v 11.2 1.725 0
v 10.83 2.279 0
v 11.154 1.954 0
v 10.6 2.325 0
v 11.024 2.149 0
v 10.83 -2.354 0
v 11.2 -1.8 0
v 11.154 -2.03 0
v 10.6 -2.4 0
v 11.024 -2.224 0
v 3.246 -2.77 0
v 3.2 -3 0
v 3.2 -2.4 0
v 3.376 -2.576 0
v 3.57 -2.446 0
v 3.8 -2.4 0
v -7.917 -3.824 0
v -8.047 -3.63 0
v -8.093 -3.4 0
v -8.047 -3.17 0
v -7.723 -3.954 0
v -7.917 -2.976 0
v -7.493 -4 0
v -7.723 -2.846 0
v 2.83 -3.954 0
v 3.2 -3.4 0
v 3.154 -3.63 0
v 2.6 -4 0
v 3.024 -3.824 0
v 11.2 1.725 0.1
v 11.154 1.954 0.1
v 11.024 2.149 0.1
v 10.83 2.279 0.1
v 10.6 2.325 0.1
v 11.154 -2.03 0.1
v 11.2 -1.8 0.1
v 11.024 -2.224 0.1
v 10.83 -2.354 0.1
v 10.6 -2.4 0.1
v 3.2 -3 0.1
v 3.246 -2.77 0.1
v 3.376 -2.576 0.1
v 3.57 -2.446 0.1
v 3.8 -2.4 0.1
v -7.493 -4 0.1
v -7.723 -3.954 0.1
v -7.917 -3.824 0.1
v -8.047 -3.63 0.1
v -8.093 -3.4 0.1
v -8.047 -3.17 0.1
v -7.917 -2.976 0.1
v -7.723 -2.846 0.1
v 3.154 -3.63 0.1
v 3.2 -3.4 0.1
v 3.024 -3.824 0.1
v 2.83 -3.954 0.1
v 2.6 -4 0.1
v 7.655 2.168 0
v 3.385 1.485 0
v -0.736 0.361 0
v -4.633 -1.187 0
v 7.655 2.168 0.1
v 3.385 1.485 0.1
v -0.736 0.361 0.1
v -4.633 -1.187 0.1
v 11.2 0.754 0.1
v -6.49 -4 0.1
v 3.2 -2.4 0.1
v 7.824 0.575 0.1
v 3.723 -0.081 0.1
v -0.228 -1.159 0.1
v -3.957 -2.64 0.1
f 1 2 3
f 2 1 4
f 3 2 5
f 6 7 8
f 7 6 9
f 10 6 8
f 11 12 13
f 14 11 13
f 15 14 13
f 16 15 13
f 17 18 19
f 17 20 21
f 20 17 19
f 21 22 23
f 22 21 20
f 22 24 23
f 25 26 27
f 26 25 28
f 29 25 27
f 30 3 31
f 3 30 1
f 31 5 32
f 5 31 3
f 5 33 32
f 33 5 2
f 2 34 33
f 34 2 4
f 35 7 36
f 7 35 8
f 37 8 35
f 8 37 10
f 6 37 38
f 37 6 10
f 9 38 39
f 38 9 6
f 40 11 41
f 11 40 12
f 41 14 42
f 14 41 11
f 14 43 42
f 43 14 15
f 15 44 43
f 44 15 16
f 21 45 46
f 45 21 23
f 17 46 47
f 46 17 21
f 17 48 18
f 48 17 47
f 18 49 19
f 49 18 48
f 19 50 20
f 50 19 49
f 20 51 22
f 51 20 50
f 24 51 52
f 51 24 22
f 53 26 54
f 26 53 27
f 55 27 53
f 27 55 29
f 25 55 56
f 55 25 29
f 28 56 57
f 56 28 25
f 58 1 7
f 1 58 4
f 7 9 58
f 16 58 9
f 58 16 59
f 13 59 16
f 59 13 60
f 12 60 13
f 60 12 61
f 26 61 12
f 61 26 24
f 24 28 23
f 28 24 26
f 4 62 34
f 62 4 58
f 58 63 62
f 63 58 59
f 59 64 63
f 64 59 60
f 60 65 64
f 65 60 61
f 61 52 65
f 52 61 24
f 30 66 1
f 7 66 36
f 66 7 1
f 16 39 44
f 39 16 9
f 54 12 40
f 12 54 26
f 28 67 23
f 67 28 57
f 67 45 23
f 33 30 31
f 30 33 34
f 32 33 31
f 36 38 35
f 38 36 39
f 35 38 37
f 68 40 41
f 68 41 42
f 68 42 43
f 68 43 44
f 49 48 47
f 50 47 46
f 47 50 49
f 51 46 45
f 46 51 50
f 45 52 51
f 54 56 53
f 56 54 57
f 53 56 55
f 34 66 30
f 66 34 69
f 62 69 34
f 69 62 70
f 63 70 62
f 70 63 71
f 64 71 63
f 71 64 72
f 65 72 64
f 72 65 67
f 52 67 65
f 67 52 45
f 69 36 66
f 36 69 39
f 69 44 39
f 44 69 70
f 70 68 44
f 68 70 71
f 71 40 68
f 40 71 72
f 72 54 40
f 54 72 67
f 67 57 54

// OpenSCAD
// file: ../p/7-16cyli.scad
use <../lib.scad>
function ldraw_lib__7_16cyli() = [
// 0 Cylinder 0.4375
// 0 Name: 7-16cyli.dat
// 0 Author: Magnus Forsberg [MagFors]
// 0 !LDRAW_ORG Primitive UPDATE 2024-01
// 0 !LICENSE Licensed under CC BY 4.0 : see CAreadme.txt
// 
// 0 BFC CERTIFY CCW
  [0,"BFC","CERTIFY"],
  [0,"BFC","CCW"],
// 
// 0 !HISTORY 2009-05-02 [PTadmin] Official Update 2009-01
// 0 !HISTORY 2024-01-03 [MagFors] Complete regeneration, original by guyvivan
// 0 !HISTORY 2024-01-29 [OrionP] Official Update 2024-01
// 
// 4 16 0.9239 0 0.3827 1 0 0 1 1 0 0.9239 1 0.3827
  [4,16,0.9239,0,0.3827,1,0,0,1,1,0,0.9239,1,0.3827],
// 4 16 0.7071 0 0.7071 0.9239 0 0.3827 0.9239 1 0.3827 0.7071 1 0.7071
  [4,16,0.7071,0,0.7071,0.9239,0,0.3827,0.9239,1,0.3827,0.7071,1,0.7071],
// 4 16 0.3827 0 0.9239 0.7071 0 0.7071 0.7071 1 0.7071 0.3827 1 0.9239
  [4,16,0.3827,0,0.9239,0.7071,0,0.7071,0.7071,1,0.7071,0.3827,1,0.9239],
// 4 16 0 0 1 0.3827 0 0.9239 0.3827 1 0.9239 0 1 1
  [4,16,0,0,1,0.3827,0,0.9239,0.3827,1,0.9239,0,1,1],
// 4 16 -0.3827 0 0.9239 0 0 1 0 1 1 -0.3827 1 0.9239
  [4,16,-0.3827,0,0.9239,0,0,1,0,1,1,-0.3827,1,0.9239],
// 4 16 -0.7071 0 0.7071 -0.3827 0 0.9239 -0.3827 1 0.9239 -0.7071 1 0.7071
  [4,16,-0.7071,0,0.7071,-0.3827,0,0.9239,-0.3827,1,0.9239,-0.7071,1,0.7071],
// 4 16 -0.9239 0 0.3827 -0.7071 0 0.7071 -0.7071 1 0.7071 -0.9239 1 0.3827
  [4,16,-0.9239,0,0.3827,-0.7071,0,0.7071,-0.7071,1,0.7071,-0.9239,1,0.3827],
// 0 // conditional lines
// 5 24 1 1 0 1 0 0 1 1 -0.4142 0.9239 1 0.3827
  [5,24,1,1,0,1,0,0,1,1,-0.4142,0.9239,1,0.3827],
// 5 24 0.9239 1 0.3827 0.9239 0 0.3827 1 1 0 0.7071 1 0.7071
  [5,24,0.9239,1,0.3827,0.9239,0,0.3827,1,1,0,0.7071,1,0.7071],
// 5 24 0.7071 1 0.7071 0.7071 0 0.7071 0.9239 1 0.3827 0.3827 1 0.9239
  [5,24,0.7071,1,0.7071,0.7071,0,0.7071,0.9239,1,0.3827,0.3827,1,0.9239],
// 5 24 0.3827 1 0.9239 0.3827 0 0.9239 0.7071 1 0.7071 0 1 1
  [5,24,0.3827,1,0.9239,0.3827,0,0.9239,0.7071,1,0.7071,0,1,1],
// 5 24 0 1 1 0 0 1 0.3827 1 0.9239 -0.3827 1 0.9239
  [5,24,0,1,1,0,0,1,0.3827,1,0.9239,-0.3827,1,0.9239],
// 5 24 -0.3827 1 0.9239 -0.3827 0 0.9239 0 1 1 -0.7071 1 0.7071
  [5,24,-0.3827,1,0.9239,-0.3827,0,0.9239,0,1,1,-0.7071,1,0.7071],
// 5 24 -0.7071 1 0.7071 -0.7071 0 0.7071 -0.3827 1 0.9239 -0.9239 1 0.3827
  [5,24,-0.7071,1,0.7071,-0.7071,0,0.7071,-0.3827,1,0.9239,-0.9239,1,0.3827],
// 5 24 -0.9239 1 0.3827 -0.9239 0 0.3827 -0.7071 1 0.7071 -1.0824 1 0
  [5,24,-0.9239,1,0.3827,-0.9239,0,0.3827,-0.7071,1,0.7071,-1.0824,1,0],
// 0 // Build by LDPartEditor (PrimGen 2.X)
];
module ldraw_lib__7_16cyli(step=0, col=false, unit=2/5, alt=false, line=0.2, solid=!$preview)
    makepoly(ldraw_lib__7_16cyli(), step=step, col=col, unit=unit, alt=alt, line=line, solid=solid);
ldraw_lib__7_16cyli(line=0.2);
// file: ../p/1-4cyli.scad
use <../lib.scad>
function ldraw_lib__1_4cyli() = [
// 0 Cylinder 0.25
// 0 Name: 1-4cyli.dat
// 0 Author: James Jessiman
// 0 !LDRAW_ORG Primitive UPDATE 2012-01
// 0 !LICENSE Licensed under CC BY 4.0 : see CAreadme.txt
// 
// 0 BFC CERTIFY CCW
  [0,"BFC","CERTIFY"],
  [0,"BFC","CCW"],
// 
// 0 !HISTORY 2002-03-23 [sbliss] Added BFC statement.
// 0 !HISTORY 2002-04-25 [PTadmin] Official Update 2002-02
// 0 !HISTORY 2007-06-22 [PTadmin] Header formatted for Contributor Agreement
// 0 !HISTORY 2008-07-01 [PTadmin] Official Update 2008-01
// 0 !HISTORY 2012-02-16 [Philo] Changed to CCW
// 0 !HISTORY 2012-03-30 [PTadmin] Official Update 2012-01
// 
// 
// 4 16 1 1 0 0.9239 1 0.3827 0.9239 0 0.3827 1 0 0
  [4,16,1,1,0,0.9239,1,0.3827,0.9239,0,0.3827,1,0,0],
// 5 24 1 0 0 1 1 0 0.9239 0 0.3827 1 0 -1
  [5,24,1,0,0,1,1,0,0.9239,0,0.3827,1,0,-1],
// 4 16 0.9239 1 0.3827 0.7071 1 0.7071 0.7071 0 0.7071 0.9239 0 0.3827
  [4,16,0.9239,1,0.3827,0.7071,1,0.7071,0.7071,0,0.7071,0.9239,0,0.3827],
// 5 24 0.9239 0 0.3827 0.9239 1 0.3827 0.7071 0 0.7071 1 0 0
  [5,24,0.9239,0,0.3827,0.9239,1,0.3827,0.7071,0,0.7071,1,0,0],
// 4 16 0.7071 1 0.7071 0.3827 1 0.9239 0.3827 0 0.9239 0.7071 0 0.7071
  [4,16,0.7071,1,0.7071,0.3827,1,0.9239,0.3827,0,0.9239,0.7071,0,0.7071],
// 5 24 0.7071 0 0.7071 0.7071 1 0.7071 0.3827 0 0.9239 0.9239 0 0.3827
  [5,24,0.7071,0,0.7071,0.7071,1,0.7071,0.3827,0,0.9239,0.9239,0,0.3827],
// 4 16 0.3827 1 0.9239 0 1 1 0 0 1 0.3827 0 0.9239
  [4,16,0.3827,1,0.9239,0,1,1,0,0,1,0.3827,0,0.9239],
// 5 24 0.3827 0 0.9239 0.3827 1 0.9239 0 0 1 0.7071 0 0.7071
  [5,24,0.3827,0,0.9239,0.3827,1,0.9239,0,0,1,0.7071,0,0.7071],
// 5 24 0 0 1 0 1 1 0.3827 0 0.9239 -1 0 1
  [5,24,0,0,1,0,1,1,0.3827,0,0.9239,-1,0,1],
];
module ldraw_lib__1_4cyli(step=0, col=false, unit=2/5, alt=false, line=0.2, solid=!$preview)
    makepoly(ldraw_lib__1_4cyli(), step=step, col=col, unit=unit, alt=alt, line=line, solid=solid);
ldraw_lib__1_4cyli(line=0.2);
// file: ../p/7-16chrd.scad
use <../lib.scad>
function ldraw_lib__7_16chrd() = [
// 0 Chord 0.4375
// 0 Name: 7-16chrd.dat
// 0 Author: Willy Tschager [Holly-Wood]
// 0 !LDRAW_ORG Primitive UPDATE 2024-01
// 0 !LICENSE Licensed under CC BY 4.0 : see CAreadme.txt
// 
// 0 BFC CERTIFY CCW
  [0,"BFC","CERTIFY"],
  [0,"BFC","CCW"],
// 
// 0 !HISTORY 2009-12-29 [PTadmin] Official Update 2009-03
// 0 !HISTORY 2024-01-10 [Holly-Wood] Complete re-write, original by guyvivan
// 0 !HISTORY 2024-01-29 [OrionP] Official Update 2024-01
// 
// 4 16 -.7071 0 .7071 -.9239 0 .3827 1 0 0 .9239 0 .3827
  [4,16,-.7071,0,.7071,-.9239,0,.3827,1,0,0,.9239,0,.3827],
// 4 16 -.7071 0 .7071 .9239 0 .3827 .7071 0 .7071 -.3827 0 .9239
  [4,16,-.7071,0,.7071,.9239,0,.3827,.7071,0,.7071,-.3827,0,.9239],
// 4 16 -.3827 0 .9239 .7071 0 .7071 .3827 0 .9239 0 0 1
  [4,16,-.3827,0,.9239,.7071,0,.7071,.3827,0,.9239,0,0,1],
// 0 // Based on LDPartEditor (PrimGen 2.X)
];
module ldraw_lib__7_16chrd(step=0, col=false, unit=2/5, alt=false, line=0.2, solid=!$preview)
    makepoly(ldraw_lib__7_16chrd(), step=step, col=col, unit=unit, alt=alt, line=line, solid=solid);
ldraw_lib__7_16chrd(line=0.2);
// file: ../p/1-4ndis.scad
use <../lib.scad>
function ldraw_lib__1_4ndis() = [
// 0 Disc Negative 0.25
// 0 Name: 1-4ndis.dat
// 0 Author: James Jessiman
// 0 !LDRAW_ORG Primitive UPDATE 2012-01
// 0 !LICENSE Licensed under CC BY 4.0 : see CAreadme.txt
// 
// 0 BFC CERTIFY CCW
  [0,"BFC","CERTIFY"],
  [0,"BFC","CCW"],
// 
// 0 !HISTORY 2002-03-23 [sbliss] Added BFC Statement
// 0 !HISTORY 2002-04-25 [PTadmin] Official Update 2002-02
// 0 !HISTORY 2007-06-22 [PTadmin] Header formatted for Contributor Agreement
// 0 !HISTORY 2008-07-01 [PTadmin] Official Update 2008-01
// 0 !HISTORY 2012-02-16 [Philo] Changed to CCW
// 0 !HISTORY 2012-03-30 [PTadmin] Official Update 2012-01
// 
// 
// 3 16 0.9239 0 0.3827 1 0 0 1 0 1
  [3,16,0.9239,0,0.3827,1,0,0,1,0,1],
// 3 16 0.7071 0 0.7071 0.9239 0 0.3827 1 0 1
  [3,16,0.7071,0,0.7071,0.9239,0,0.3827,1,0,1],
// 3 16 0.3827 0 0.9239 0.7071 0 0.7071 1 0 1
  [3,16,0.3827,0,0.9239,0.7071,0,0.7071,1,0,1],
// 3 16 0 0 1 0.3827 0 0.9239 1 0 1
  [3,16,0,0,1,0.3827,0,0.9239,1,0,1],
];
module ldraw_lib__1_4ndis(step=0, col=false, unit=2/5, alt=false, line=0.2, solid=!$preview)
    makepoly(ldraw_lib__1_4ndis(), step=step, col=col, unit=unit, alt=alt, line=line, solid=solid);
ldraw_lib__1_4ndis(line=0.2);
// file: ../p/1-4chrd.scad
use <../lib.scad>
function ldraw_lib__1_4chrd() = [
// 0 Chord 0.25
// 0 Name: 1-4chrd.dat
// 0 Author: Max Martin Richter [MMR1988]
// 0 !LDRAW_ORG Primitive UPDATE 2023-05
// 0 !LICENSE Licensed under CC BY 4.0 : see CAreadme.txt
// 
// 0 BFC CERTIFY CCW
  [0,"BFC","CERTIFY"],
  [0,"BFC","CCW"],
// 
// 0 !HISTORY 2004-04-22 [PTadmin] Official Update 2004-02
// 0 !HISTORY 2007-10-09 [PTadmin] Header formatted for Contributor Agreement
// 0 !HISTORY 2008-07-01 [PTadmin] Official Update 2008-01
// 0 !HISTORY 2012-08-02 [MMR1988] Re-creation with PrimGen2 and Rectifier
// 0 !HISTORY 2012-08-09 [PTadmin] Official Update 2012-02
// 0 !HISTORY 2023-10-27 [OrionP] Change author to MMR1988 from hafhead
// 0 !HISTORY 2023-10-31 [OrionP] Official Update 2023-05
// 
// 4 16 0.9239 0 0.3827 0.3827 0 0.9239 0 0 1 1 0 0
  [4,16,0.9239,0,0.3827,0.3827,0,0.9239,0,0,1,1,0,0],
// 3 16 0.7071 0 0.7071 0.3827 0 0.9239 0.9239 0 0.3827
  [3,16,0.7071,0,0.7071,0.3827,0,0.9239,0.9239,0,0.3827],
];
module ldraw_lib__1_4chrd(step=0, col=false, unit=2/5, alt=false, line=0.2, solid=!$preview)
    makepoly(ldraw_lib__1_4chrd(), step=step, col=col, unit=unit, alt=alt, line=line, solid=solid);
ldraw_lib__1_4chrd(line=0.2);
// file: s/stickerback008x024a.scad
use <../../lib.scad>
use <../../p/1-4chrd.scad>
use <../../p/1-4cyli.scad>
use <../../p/1-4ndis.scad>
use <../../p/7-16chrd.scad>
use <../../p/7-16cyli.scad>
function ldraw_lib__s__stickerback008x024a() = [
// 0 ~Sticker Back  0.8 x  2.4 for Side of Slope Brick Curved  3 x  1
// 0 Name: s\stickerback008x024a.dat
// 0 Author: Massimo Maso [Sirio]
// 0 !LDRAW_ORG Subpart UPDATE 2026-05
// 0 !LICENSE Licensed under CC BY 4.0 : see CAreadme.txt
// 
// 0 !HELP This is a stickerback, but it doesn't cover all the side of the 50950
// 
// 0 BFC CERTIFY CCW
  [0,"BFC","CERTIFY"],
  [0,"BFC","CCW"],
// 
// 0 !HISTORY 2026-05-31 [OrionP] Official Update 2026-05
// 
// 0 // Primitives
// 1 16 -26.5 0 4.3116 -1.5 0 0 0 -1 0 0 0 1.5 1-4chrd.dat
  [1,16,-26.5,0,4.3116,-1.5,0,0,0,-1,0,0,0,1.5, ldraw_lib__1_4chrd()],
// 1 16 -26.5 0 -4.5 -1.5 0 0 0 -1 0 0 0 -1.5 1-4chrd.dat
  [1,16,-26.5,0,-4.5,-1.5,0,0,0,-1,0,0,0,-1.5, ldraw_lib__1_4chrd()],
// 1 16 -9.5 0 -7.5 1.5 0 0 0 -1 0 0 0 1.5 1-4ndis.dat
  [1,16,-9.5,0,-7.5,1.5,0,0,0,-1,0,0,0,1.5, ldraw_lib__1_4ndis()],
// 1 16 18.7325 0 -8.5 0 0 1.5 0 -1 0 -1.5 0 0 7-16chrd.dat
  [1,16,18.7325,0,-8.5,0,0,1.5,0,-1,0,-1.5,0,0, ldraw_lib__7_16chrd()],
// 1 16 -6.5 0 -8.5 -1.5 0 0 0 -1 0 0 0 -1.5 1-4chrd.dat
  [1,16,-6.5,0,-8.5,-1.5,0,0,0,-1,0,0,0,-1.5, ldraw_lib__1_4chrd()],
// 1 16 -26.5 0 4.3116 -1.5 0 0 0 -.25 0 0 0 1.5 1-4cyli.dat
  [1,16,-26.5,0,4.3116,-1.5,0,0,0,-.25,0,0,0,1.5, ldraw_lib__1_4cyli()],
// 1 16 -26.5 0 -4.5 -1.5 0 0 0 -.25 0 0 0 -1.5 1-4cyli.dat
  [1,16,-26.5,0,-4.5,-1.5,0,0,0,-.25,0,0,0,-1.5, ldraw_lib__1_4cyli()],
// 0 BFC INVERTNEXT
  [0,"BFC","INVERTNEXT"],
// 1 16 -9.5 0 -7.5 1.5 0 0 0 -.25 0 0 0 1.5 1-4cyli.dat
  [1,16,-9.5,0,-7.5,1.5,0,0,0,-.25,0,0,0,1.5, ldraw_lib__1_4cyli()],
// 1 16 18.7325 0 -8.5 0 0 1.5 0 -.25 0 -1.5 0 0 7-16cyli.dat
  [1,16,18.7325,0,-8.5,0,0,1.5,0,-.25,0,-1.5,0,0, ldraw_lib__7_16cyli()],
// 1 16 -6.5 0 -8.5 -1.5 0 0 0 -.25 0 0 0 -1.5 1-4cyli.dat
  [1,16,-6.5,0,-8.5,-1.5,0,0,0,-.25,0,0,0,-1.5, ldraw_lib__1_4cyli()],
// 0 // Bottom faces
// 4 16 -19.1381 0 5.4212 -28 0 -4.5 -28 0 4.3116 -26.5 0 5.8116
  [4,16,-19.1381,0,5.4212,-28,0,-4.5,-28,0,4.3116,-26.5,0,5.8116],
// 3 16 -19.1381 0 5.4212 -26.5 0 -6 -28 0 -4.5
  [3,16,-19.1381,0,5.4212,-26.5,0,-6,-28,0,-4.5],
// 4 16 -19.1381 0 5.4212 -8.4622 0 3.7137 -9.5 0 -6 -26.5 0 -6
  [4,16,-19.1381,0,5.4212,-8.4622,0,3.7137,-9.5,0,-6,-26.5,0,-6],
// 4 16 1.8392 0 .9037 -8 0 -6 -9.5 0 -6 -8.4622 0 3.7137
  [4,16,1.8392,0,.9037,-8,0,-6,-9.5,0,-6,-8.4622,0,3.7137],
// 4 16 1.8392 0 .9037 11.5818 0 -2.9663 -8 0 -7.5 -8 0 -6
  [4,16,1.8392,0,.9037,11.5818,0,-2.9663,-8,0,-7.5,-8,0,-6],
// 4 16 -8 0 -8.5 -8 0 -7.5 11.5818 0 -2.9663 19.30655 0 -7.11415
  [4,16,-8,0,-8.5,-8,0,-7.5,11.5818,0,-2.9663,19.30655,0,-7.11415],
// 4 16 -8 0 -8.5 19.30655 0 -7.11415 18.7325 0 -10 -6.5 0 -10
  [4,16,-8,0,-8.5,19.30655,0,-7.11415,18.7325,0,-10,-6.5,0,-10],
// 0 // Lateral faces
// 4 16 -19.1381 0 5.4212 -26.5 0 5.8116 -26.5 -.25 5.8116 -19.1381 -.25 5.4212
  [4,16,-19.1381,0,5.4212,-26.5,0,5.8116,-26.5,-.25,5.8116,-19.1381,-.25,5.4212],
// 4 16 -19.1381 0 5.4212 -19.1381 -.25 5.4212 -8.4622 -.25 3.7137 -8.4622 0 3.7137
  [4,16,-19.1381,0,5.4212,-19.1381,-.25,5.4212,-8.4622,-.25,3.7137,-8.4622,0,3.7137],
// 4 16 1.8392 0 .9037 -8.4622 0 3.7137 -8.4622 -.25 3.7137 1.8392 -.25 .9037
  [4,16,1.8392,0,.9037,-8.4622,0,3.7137,-8.4622,-.25,3.7137,1.8392,-.25,.9037],
// 4 16 1.8392 0 .9037 1.8392 -.25 .9037 11.5818 -.25 -2.9663 11.5818 0 -2.9663
  [4,16,1.8392,0,.9037,1.8392,-.25,.9037,11.5818,-.25,-2.9663,11.5818,0,-2.9663],
// 4 16 19.30655 0 -7.11415 11.5818 0 -2.9663 11.5818 -.25 -2.9663 19.30655 -.25 -7.11415
  [4,16,19.30655,0,-7.11415,11.5818,0,-2.9663,11.5818,-.25,-2.9663,19.30655,-.25,-7.11415],
// 3 16 -28 0 4.3116 -28 -.25 1.8855 -28 -.25 4.3116
  [3,16,-28,0,4.3116,-28,-.25,1.8855,-28,-.25,4.3116],
// 4 16 -28 0 4.3116 -28 0 -4.5 -28 -.25 -4.5 -28 -.25 1.8855
  [4,16,-28,0,4.3116,-28,0,-4.5,-28,-.25,-4.5,-28,-.25,1.8855],
// 4 16 -26.5 0 -6 -9.5 0 -6 -9.5 -.25 -6 -26.5 -.25 -6
  [4,16,-26.5,0,-6,-9.5,0,-6,-9.5,-.25,-6,-26.5,-.25,-6],
// 4 16 -8 0 -7.5 -8 0 -8.5 -8 -.25 -8.5 -8 -.25 -7.5
  [4,16,-8,0,-7.5,-8,0,-8.5,-8,-.25,-8.5,-8,-.25,-7.5],
// 4 16 18.7325 0 -10 16.2256 -.25 -10 -6.5 -.25 -10 -6.5 0 -10
  [4,16,18.7325,0,-10,16.2256,-.25,-10,-6.5,-.25,-10,-6.5,0,-10],
// 3 16 18.7325 0 -10 18.7325 -.25 -10 16.2256 -.25 -10
  [3,16,18.7325,0,-10,18.7325,-.25,-10,16.2256,-.25,-10],
// 0 // Conditional lines
// 5 24 -26.5 0 5.8116 -26.5 -.25 5.8116 -19.1381 0 5.4212 -27.07405 0 5.69745
  [5,24,-26.5,0,5.8116,-26.5,-.25,5.8116,-19.1381,0,5.4212,-27.07405,0,5.69745],
// 5 24 -19.1381 0 5.4212 -19.1381 -.25 5.4212 -8.4622 0 3.7137 -26.5 0 5.8116
  [5,24,-19.1381,0,5.4212,-19.1381,-.25,5.4212,-8.4622,0,3.7137,-26.5,0,5.8116],
// 5 24 -8.4622 0 3.7137 -8.4622 -.25 3.7137 1.8392 0 .9037 -19.1381 0 5.4212
  [5,24,-8.4622,0,3.7137,-8.4622,-.25,3.7137,1.8392,0,.9037,-19.1381,0,5.4212],
// 5 24 1.8392 0 .9037 1.8392 -.25 .9037 11.5818 0 -2.9663 -8.4622 0 3.7137
  [5,24,1.8392,0,.9037,1.8392,-.25,.9037,11.5818,0,-2.9663,-8.4622,0,3.7137],
// 5 24 11.5818 0 -2.9663 11.5818 -.25 -2.9663 19.30655 0 -7.11415 1.8392 0 .9037
  [5,24,11.5818,0,-2.9663,11.5818,-.25,-2.9663,19.30655,0,-7.11415,1.8392,0,.9037],
// 5 24 19.30655 0 -7.11415 19.30655 -.25 -7.11415 19.79315 0 -7.43935 11.5818 0 -2.9663
  [5,24,19.30655,0,-7.11415,19.30655,-.25,-7.11415,19.79315,0,-7.43935,11.5818,0,-2.9663],
];
module ldraw_lib__s__stickerback008x024a(step=0, col=false, unit=2/5, alt=false, line=0.2, solid=!$preview)
    makepoly(ldraw_lib__s__stickerback008x024a(), step=step, col=col, unit=unit, alt=alt, line=line, solid=solid);
ldraw_lib__s__stickerback008x024a(line=0.2);
// file: s/6221655ads02.scad
use <../../lib.scad>
use <../../p/1-4chrd.scad>
use <../../p/1-4ndis.scad>
use <../../p/7-16chrd.scad>
function ldraw_lib__s__6221655ads02() = [
// 0 ~Sticker  0.8 x  2.4 with Black Curved Stripe on Lime Background Right - Top Face
// 0 Name: s\6221655ads02.dat
// 0 Author: Massimo Maso [Sirio]
// 0 !LDRAW_ORG Subpart UPDATE 2026-05
// 0 !LICENSE Licensed under CC BY 4.0 : see CAreadme.txt
// 
// 0 !HELP Stickers' geometry in common with set 75895 (sheet 6285381)
// 
// 0 BFC CERTIFY CCW
  [0,"BFC","CERTIFY"],
  [0,"BFC","CCW"],
// 
// 0 !HISTORY 2024-10-27 [OrionP] Official Update 2024-09
// 0 !HISTORY 2025-11-17 [Sirio] Adapted to new 50950 geometry
// 0 !HISTORY 2026-05-31 [OrionP] Official Update 2026-05
// 
// 0 // Primitives
// 1 0 -26.5 -.25 4.3116 -1.5 0 0 0 1 0 0 0 1.5 1-4chrd.dat
  [1,0,-26.5,-.25,4.3116,-1.5,0,0,0,1,0,0,0,1.5, ldraw_lib__1_4chrd()],
// 1 16 -26.5 -.25 -4.5 -1.5 0 0 0 1 0 0 0 -1.5 1-4chrd.dat
  [1,16,-26.5,-.25,-4.5,-1.5,0,0,0,1,0,0,0,-1.5, ldraw_lib__1_4chrd()],
// 1 16 -9.5 -.25 -7.5 1.5 0 0 0 1 0 0 0 1.5 1-4ndis.dat
  [1,16,-9.5,-.25,-7.5,1.5,0,0,0,1,0,0,0,1.5, ldraw_lib__1_4ndis()],
// 1 0 18.7325 -.25 -8.5 0 0 1.5 0 1 0 -1.5 0 0 7-16chrd.dat
  [1,0,18.7325,-.25,-8.5,0,0,1.5,0,1,0,-1.5,0,0, ldraw_lib__7_16chrd()],
// 1 16 -6.5 -.25 -8.5 -1.5 0 0 0 1 0 0 0 -1.5 1-4chrd.dat
  [1,16,-6.5,-.25,-8.5,-1.5,0,0,0,1,0,0,0,-1.5, ldraw_lib__1_4chrd()],
// 0 // Black faces
// 4 0 -19.5611 -.25 1.438 -26.5 -.25 5.8116 -28 -.25 4.3116 -28 -.25 1.8855
  [4,0,-19.5611,-.25,1.438,-26.5,-.25,5.8116,-28,-.25,4.3116,-28,-.25,1.8855],
// 4 0 -19.5611 -.25 1.438 -9.3068 -.25 -.202 -19.1381 -.25 5.4212 -26.5 -.25 5.8116
  [4,0,-19.5611,-.25,1.438,-9.3068,-.25,-.202,-19.1381,-.25,5.4212,-26.5,-.25,5.8116],
// 4 0 .5706 -.25 -2.8964 -8.4622 -.25 3.7137 -19.1381 -.25 5.4212 -9.3068 -.25 -.202
  [4,0,.5706,-.25,-2.8964,-8.4622,-.25,3.7137,-19.1381,-.25,5.4212,-9.3068,-.25,-.202],
// 4 0 .5706 -.25 -2.8964 9.8918 -.25 -6.599 1.8392 -.25 .9037 -8.4622 -.25 3.7137
  [4,0,.5706,-.25,-2.8964,9.8918,-.25,-6.599,1.8392,-.25,.9037,-8.4622,-.25,3.7137],
// 4 0 16.2256 -.25 -10 11.5818 -.25 -2.9663 1.8392 -.25 .9037 9.8918 -.25 -6.599
  [4,0,16.2256,-.25,-10,11.5818,-.25,-2.9663,1.8392,-.25,.9037,9.8918,-.25,-6.599],
// 4 0 16.2256 -.25 -10 18.7325 -.25 -10 19.30655 -.25 -7.11415 11.5818 -.25 -2.9663
  [4,0,16.2256,-.25,-10,18.7325,-.25,-10,19.30655,-.25,-7.11415,11.5818,-.25,-2.9663],
// 0 // Green faces
// 4 16 -26.5 -.25 -6 -19.5611 -.25 1.438 -28 -.25 1.8855 -28 -.25 -4.5
  [4,16,-26.5,-.25,-6,-19.5611,-.25,1.438,-28,-.25,1.8855,-28,-.25,-4.5],
// 4 16 -26.5 -.25 -6 -9.5 -.25 -6 -9.3068 -.25 -.202 -19.5611 -.25 1.438
  [4,16,-26.5,-.25,-6,-9.5,-.25,-6,-9.3068,-.25,-.202,-19.5611,-.25,1.438],
// 4 16 -8 -.25 -6 .5706 -.25 -2.8964 -9.3068 -.25 -.202 -9.5 -.25 -6
  [4,16,-8,-.25,-6,.5706,-.25,-2.8964,-9.3068,-.25,-.202,-9.5,-.25,-6],
// 4 16 -8 -.25 -6 -8 -.25 -7.5 9.8918 -.25 -6.599 .5706 -.25 -2.8964
  [4,16,-8,-.25,-6,-8,-.25,-7.5,9.8918,-.25,-6.599,.5706,-.25,-2.8964],
// 4 16 -8 -.25 -8.5 16.2256 -.25 -10 9.8918 -.25 -6.599 -8 -.25 -7.5
  [4,16,-8,-.25,-8.5,16.2256,-.25,-10,9.8918,-.25,-6.599,-8,-.25,-7.5],
// 3 16 -8 -.25 -8.5 -6.5 -.25 -10 16.2256 -.25 -10
  [3,16,-8,-.25,-8.5,-6.5,-.25,-10,16.2256,-.25,-10],
];
module ldraw_lib__s__6221655ads02(step=0, col=false, unit=2/5, alt=false, line=0.2, solid=!$preview)
    makepoly(ldraw_lib__s__6221655ads02(), step=step, col=col, unit=unit, alt=alt, line=line, solid=solid);
ldraw_lib__s__6221655ads02(line=0.2);
// file: 6285381g.scad
use <../lib.scad>
use <s/6221655ads02.scad>
use <s/stickerback008x024a.scad>
function ldraw_lib__6285381g() = [
// 0 Sticker  0.8 x  2.4 with Black Curved Stripe on Transparent Background Right
// 0 Name: 6285381g.dat
// 0 Author: Magnus Forsberg [MagFors]
// 0 !LDRAW_ORG Part UPDATE 2026-05
// 0 !LICENSE Licensed under CC BY 4.0 : see CAreadme.txt
// 
// 0 BFC CERTIFY CCW
  [0,"BFC","CERTIFY"],
  [0,"BFC","CCW"],
// 
// 0 !KEYWORDS 911, Bricklink 75895stk01, Brickowl 178456, bumper, front, Porsche
// 0 !KEYWORDS Rebrickable 65827, set 75895
// 
// 0 !HISTORY 2022-12-20 [PTadmin] Official Update 2022-06
// 0 !HISTORY 2025-11-14 [Sirio] Modified for changes in 50950; introduced stickerback; changed description; make geometry in common with set 75888
// 0 !HISTORY 2026-05-31 [OrionP] Official Update 2026-05
// 
// 1 16 0 0 0 1 0 0 0 1 0 0 0 1 s\stickerback008x024a.dat
  [1,16,0,0,0,1,0,0,0,1,0,0,0,1, ldraw_lib__s__stickerback008x024a()],
// 1 16 0 0 0 1 0 0 0 1 0 0 0 1 s\6221655ads02.dat
  [1,16,0,0,0,1,0,0,0,1,0,0,0,1, ldraw_lib__s__6221655ads02()],
];
module ldraw_lib__6285381g(step=0, col=false, unit=2/5, alt=false, line=0.2, solid=!$preview)
    makepoly(ldraw_lib__6285381g(), step=step, col=col, unit=unit, alt=alt, line=line, solid=solid);
ldraw_lib__6285381g(line=0.2);
// main file
use <../lib.scad>
use <6285381g.scad>
function ldraw_lib__6285381h() = [
// 0 Sticker  0.8 x  2.4 with Black Curved Stripe on Transparent Background Left
// 0 Name: 6285381h.dat
// 0 Author: Magnus Forsberg [MagFors]
// 0 !LDRAW_ORG Part UPDATE 2026-05
// 0 !LICENSE Licensed under CC BY 4.0 : see CAreadme.txt
// 
// 0 BFC CERTIFY CCW
  [0,"BFC","CERTIFY"],
  [0,"BFC","CCW"],
// 
// 0 !KEYWORDS 911, Bricklink 75895stk01, Brickowl 178456, bumper, front, Porsche
// 0 !KEYWORDS Rebrickable 65827, set 75895
// 
// 0 !HISTORY 2022-12-20 [PTadmin] Official Update 2022-06
// 0 !HISTORY 2025-11-14 [Sirio] Modified for changes in 50950; introduced stickerback; changed description; make geometry in common with set 75888
// 0 !HISTORY 2026-05-31 [OrionP] Official Update 2026-05
// 
// 1 16 0 0 0 -1 0 0 0 1 0 0 0 1 6285381g.dat
  [1,16,0,0,0,-1,0,0,0,1,0,0,0,1, ldraw_lib__6285381g()],
];
module ldraw_lib__6285381h(step=0, col=false, unit=2/5, alt=false, line=0.2, solid=!$preview)
    makepoly(ldraw_lib__6285381h(), step=step, col=col, unit=unit, alt=alt, line=line, solid=solid);
ldraw_lib__6285381h(line=0.2);
